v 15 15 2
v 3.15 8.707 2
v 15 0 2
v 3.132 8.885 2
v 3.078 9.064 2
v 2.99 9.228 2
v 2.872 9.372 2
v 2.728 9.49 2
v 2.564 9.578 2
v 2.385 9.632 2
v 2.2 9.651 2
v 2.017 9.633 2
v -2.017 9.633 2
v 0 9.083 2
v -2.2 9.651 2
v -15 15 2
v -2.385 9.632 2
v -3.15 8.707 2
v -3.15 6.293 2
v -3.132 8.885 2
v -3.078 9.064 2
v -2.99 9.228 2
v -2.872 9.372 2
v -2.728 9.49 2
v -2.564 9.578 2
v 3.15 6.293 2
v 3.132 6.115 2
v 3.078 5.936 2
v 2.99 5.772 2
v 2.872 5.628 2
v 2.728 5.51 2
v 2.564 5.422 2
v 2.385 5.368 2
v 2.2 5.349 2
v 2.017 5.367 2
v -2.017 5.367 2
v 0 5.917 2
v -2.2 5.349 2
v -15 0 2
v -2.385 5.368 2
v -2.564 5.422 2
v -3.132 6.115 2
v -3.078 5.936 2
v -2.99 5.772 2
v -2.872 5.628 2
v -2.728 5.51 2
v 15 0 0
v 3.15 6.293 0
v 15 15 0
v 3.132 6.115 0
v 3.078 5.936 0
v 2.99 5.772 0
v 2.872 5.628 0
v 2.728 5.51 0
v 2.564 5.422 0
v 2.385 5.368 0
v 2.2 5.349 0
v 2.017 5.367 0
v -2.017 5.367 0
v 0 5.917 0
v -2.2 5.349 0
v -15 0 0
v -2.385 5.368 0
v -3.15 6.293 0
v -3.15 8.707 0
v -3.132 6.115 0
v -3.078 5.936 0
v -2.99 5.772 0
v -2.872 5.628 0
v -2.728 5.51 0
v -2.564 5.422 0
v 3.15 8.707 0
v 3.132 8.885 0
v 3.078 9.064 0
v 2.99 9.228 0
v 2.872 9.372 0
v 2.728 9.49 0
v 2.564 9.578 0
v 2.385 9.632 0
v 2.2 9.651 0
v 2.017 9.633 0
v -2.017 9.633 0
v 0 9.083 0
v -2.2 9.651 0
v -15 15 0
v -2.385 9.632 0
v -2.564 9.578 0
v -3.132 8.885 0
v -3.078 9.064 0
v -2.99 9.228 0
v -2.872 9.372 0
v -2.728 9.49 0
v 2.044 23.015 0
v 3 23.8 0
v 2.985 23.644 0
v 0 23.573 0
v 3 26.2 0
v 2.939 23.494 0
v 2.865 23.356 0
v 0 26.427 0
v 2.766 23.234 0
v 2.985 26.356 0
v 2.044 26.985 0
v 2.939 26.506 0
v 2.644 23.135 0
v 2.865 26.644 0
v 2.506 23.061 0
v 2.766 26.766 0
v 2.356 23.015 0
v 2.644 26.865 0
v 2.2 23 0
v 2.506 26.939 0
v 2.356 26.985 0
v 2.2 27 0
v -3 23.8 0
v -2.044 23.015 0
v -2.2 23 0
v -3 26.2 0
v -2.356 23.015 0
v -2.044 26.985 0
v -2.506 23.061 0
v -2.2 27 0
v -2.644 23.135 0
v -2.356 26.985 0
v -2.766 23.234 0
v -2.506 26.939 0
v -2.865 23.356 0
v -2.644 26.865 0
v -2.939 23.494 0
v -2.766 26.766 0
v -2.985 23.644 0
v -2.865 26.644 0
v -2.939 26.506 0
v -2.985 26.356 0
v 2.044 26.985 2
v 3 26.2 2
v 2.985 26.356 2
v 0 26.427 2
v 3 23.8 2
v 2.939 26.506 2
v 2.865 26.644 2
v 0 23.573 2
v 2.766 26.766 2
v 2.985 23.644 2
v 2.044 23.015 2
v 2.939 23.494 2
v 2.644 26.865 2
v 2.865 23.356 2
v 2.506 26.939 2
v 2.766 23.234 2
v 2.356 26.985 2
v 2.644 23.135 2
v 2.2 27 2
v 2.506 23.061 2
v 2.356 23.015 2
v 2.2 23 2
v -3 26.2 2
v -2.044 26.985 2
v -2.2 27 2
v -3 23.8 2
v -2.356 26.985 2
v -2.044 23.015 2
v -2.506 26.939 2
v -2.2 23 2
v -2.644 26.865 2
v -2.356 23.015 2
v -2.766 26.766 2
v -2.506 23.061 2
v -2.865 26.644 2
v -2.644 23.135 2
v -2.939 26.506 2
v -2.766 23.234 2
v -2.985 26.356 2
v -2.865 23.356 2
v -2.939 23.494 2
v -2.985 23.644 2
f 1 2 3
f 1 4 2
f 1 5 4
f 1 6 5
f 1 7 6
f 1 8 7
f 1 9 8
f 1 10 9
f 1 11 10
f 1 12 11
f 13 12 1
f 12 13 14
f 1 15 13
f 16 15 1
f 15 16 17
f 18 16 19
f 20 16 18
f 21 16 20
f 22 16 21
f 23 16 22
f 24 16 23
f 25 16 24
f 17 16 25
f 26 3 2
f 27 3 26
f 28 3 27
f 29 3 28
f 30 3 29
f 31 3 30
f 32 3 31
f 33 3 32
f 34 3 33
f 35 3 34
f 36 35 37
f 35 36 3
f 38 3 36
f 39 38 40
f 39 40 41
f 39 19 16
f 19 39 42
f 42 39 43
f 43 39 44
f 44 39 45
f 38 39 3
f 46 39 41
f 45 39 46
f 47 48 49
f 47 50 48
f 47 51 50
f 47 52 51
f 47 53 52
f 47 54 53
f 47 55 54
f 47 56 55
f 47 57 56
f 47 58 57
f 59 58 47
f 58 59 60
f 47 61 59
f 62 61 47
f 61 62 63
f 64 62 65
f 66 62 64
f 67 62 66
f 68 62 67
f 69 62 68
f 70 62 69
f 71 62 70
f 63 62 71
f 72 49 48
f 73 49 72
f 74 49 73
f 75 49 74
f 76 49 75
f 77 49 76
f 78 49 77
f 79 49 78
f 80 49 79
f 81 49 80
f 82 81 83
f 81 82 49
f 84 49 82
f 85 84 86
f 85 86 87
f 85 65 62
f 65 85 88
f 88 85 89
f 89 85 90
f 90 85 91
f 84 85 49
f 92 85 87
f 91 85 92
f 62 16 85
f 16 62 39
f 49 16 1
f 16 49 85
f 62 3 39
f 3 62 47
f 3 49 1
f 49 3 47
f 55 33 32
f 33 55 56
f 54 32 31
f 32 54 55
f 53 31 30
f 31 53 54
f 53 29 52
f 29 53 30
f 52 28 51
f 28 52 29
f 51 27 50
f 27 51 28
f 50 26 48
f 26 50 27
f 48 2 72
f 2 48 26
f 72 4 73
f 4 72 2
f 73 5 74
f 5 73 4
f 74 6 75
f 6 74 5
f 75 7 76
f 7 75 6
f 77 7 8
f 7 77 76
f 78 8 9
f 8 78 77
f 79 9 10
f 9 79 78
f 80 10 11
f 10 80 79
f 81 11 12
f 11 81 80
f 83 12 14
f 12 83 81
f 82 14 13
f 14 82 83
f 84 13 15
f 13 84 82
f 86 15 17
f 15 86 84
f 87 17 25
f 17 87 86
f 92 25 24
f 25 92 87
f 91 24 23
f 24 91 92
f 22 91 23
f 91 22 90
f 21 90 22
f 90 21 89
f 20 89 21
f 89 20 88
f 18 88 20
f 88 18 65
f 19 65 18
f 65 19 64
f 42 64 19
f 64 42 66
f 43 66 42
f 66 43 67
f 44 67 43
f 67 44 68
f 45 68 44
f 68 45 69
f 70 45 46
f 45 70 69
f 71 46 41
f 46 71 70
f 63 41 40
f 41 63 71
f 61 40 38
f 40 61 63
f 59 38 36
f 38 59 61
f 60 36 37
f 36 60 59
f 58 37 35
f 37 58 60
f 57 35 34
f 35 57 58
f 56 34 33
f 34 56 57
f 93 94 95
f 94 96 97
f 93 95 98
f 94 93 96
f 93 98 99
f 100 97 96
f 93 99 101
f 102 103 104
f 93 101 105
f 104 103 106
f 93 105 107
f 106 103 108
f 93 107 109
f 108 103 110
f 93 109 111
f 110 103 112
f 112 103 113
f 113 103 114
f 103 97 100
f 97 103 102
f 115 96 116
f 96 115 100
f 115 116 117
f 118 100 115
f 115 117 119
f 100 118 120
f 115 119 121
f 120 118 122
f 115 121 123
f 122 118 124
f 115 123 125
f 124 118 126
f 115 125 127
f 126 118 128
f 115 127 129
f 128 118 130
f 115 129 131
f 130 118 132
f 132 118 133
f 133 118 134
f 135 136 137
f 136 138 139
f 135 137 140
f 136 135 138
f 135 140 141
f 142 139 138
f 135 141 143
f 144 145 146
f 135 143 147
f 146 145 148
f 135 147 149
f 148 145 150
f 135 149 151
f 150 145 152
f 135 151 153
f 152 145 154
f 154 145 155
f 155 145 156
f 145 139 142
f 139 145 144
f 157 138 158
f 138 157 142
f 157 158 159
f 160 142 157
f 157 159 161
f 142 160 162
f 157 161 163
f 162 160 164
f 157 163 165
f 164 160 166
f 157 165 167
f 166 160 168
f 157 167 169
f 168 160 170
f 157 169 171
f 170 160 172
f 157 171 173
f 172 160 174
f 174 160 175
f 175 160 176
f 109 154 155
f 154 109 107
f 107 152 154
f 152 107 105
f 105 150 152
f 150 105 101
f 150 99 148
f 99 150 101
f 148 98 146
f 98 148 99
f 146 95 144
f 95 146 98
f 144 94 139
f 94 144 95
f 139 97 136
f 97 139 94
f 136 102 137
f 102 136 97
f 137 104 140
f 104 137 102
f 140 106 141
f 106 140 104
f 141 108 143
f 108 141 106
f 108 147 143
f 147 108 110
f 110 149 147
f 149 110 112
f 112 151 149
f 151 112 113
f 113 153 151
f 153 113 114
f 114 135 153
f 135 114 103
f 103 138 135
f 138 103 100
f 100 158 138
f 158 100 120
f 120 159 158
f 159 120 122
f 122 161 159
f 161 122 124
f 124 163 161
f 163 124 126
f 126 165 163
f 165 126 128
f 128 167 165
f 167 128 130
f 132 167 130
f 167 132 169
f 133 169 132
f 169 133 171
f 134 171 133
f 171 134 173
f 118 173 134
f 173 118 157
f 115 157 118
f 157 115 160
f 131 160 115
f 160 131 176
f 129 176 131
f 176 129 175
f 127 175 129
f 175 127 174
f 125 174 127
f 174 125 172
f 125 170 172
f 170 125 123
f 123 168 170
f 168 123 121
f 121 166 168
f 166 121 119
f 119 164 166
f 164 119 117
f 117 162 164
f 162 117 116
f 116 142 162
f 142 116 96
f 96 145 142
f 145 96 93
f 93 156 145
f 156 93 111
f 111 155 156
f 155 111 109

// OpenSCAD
// gridfinity_frame_connectors.scad
//
// A loose bowtie ("butterfly key") connector for joining separately printed
// Gridfinity baseplates along a shared edge. A key-shaped pocket is cut
// straddling the seam in each plate (see gridfinity_baseplate.scad's
// `key_*` parameters), and a separately printed key (gridfinity_key()) is
// dropped in vertically across the seam. Because the key is narrower at its
// waist (centered on the seam) than at either end, it resists the two
// plates being pulled apart sideways once both pockets are filled -- the
// same principle as a woodworking bowtie/butterfly inlay.
//
// Attribution: this bowtie profile is adapted from the ButterFlyConnector()
// module in ostat's gridfinity_extended_openscad project
// (modules/module_gridfinity_frame_connectors.scad),
// https://github.com/ostat/gridfinity_extended_openscad, licensed GPL-3.0.
// It's reimplemented standalone here -- without that project's grid/frame
// coordinate system ($gci, env_pitch(), etc.) -- to match this repo's
// conventions. See README.md for the full attribution notice.
//
// Units are millimeters. The 2D profile is centered on the origin with its
// long axis (lobe to lobe) along X and its waist at x = 0 -- lay the origin
// on the seam between two plates so one lobe embeds in each plate.
//
// Usage:
//   use <gridfinity_frame_connectors.scad>
//   linear_extrude(2) gridfinity_key_2d();         // the loose key, printed separately
//   linear_extrude(2) gridfinity_key_socket_2d();  // pocket to cut into each plate
//
// Open this file directly (or `include <>` it) to render the demo at the
// bottom; `use <>` imports the modules without rendering anything.

// ---------------------------------------------------------------------------
// 2D profile
// ---------------------------------------------------------------------------

// The bowtie/butterfly profile: two rounded wedges tip to tip, wide at each
// end and pinched at the waist (x = 0).
//   size : [length, width] -- overall lobe-to-lobe length (X) and lobe width (Y)
//   r    : corner radius; also sets the minimum waist half-width
module gridfinity_key_2d(size = [6, 4], r = 0.8, fn = 32) {
    a = size.y / 2 - r; // half-height of each lobe's wide edge
    b = size.x / 2 - r; // distance from center to each lobe's wide edge

    module wedge()
        hull() {
            translate([-b, -a]) circle(r = r, $fn = fn);
            translate([-b, a]) circle(r = r, $fn = fn);
            translate([b, 0]) circle(r = r, $fn = fn);
        }

    union() {
        wedge();
        mirror([1, 0, 0]) wedge();
    }
}

// An oversized pocket matching gridfinity_key_2d(), sized with `clearance`
// added all around so the loose key seats with a snug press fit.
module gridfinity_key_socket_2d(size = [6, 4], r = 0.8, clearance = 0.15, fn = 32)
    offset(delta = clearance)
        gridfinity_key_2d(size, r, fn);

// ---------------------------------------------------------------------------
// 3D key
// ---------------------------------------------------------------------------

// The loose butterfly key, extruded to `thickness` -- print this once per
// connector, separately from either baseplate.
module gridfinity_key(size = [6, 4], r = 0.8, thickness = 2, fn = 32)
    linear_extrude(thickness)
        gridfinity_key_2d(size, r, fn);

// ---------------------------------------------------------------------------
// Demo (rendered only when this file is opened / included directly)
// ---------------------------------------------------------------------------

// Two abutting plate stubs, each with a matching pocket straddling the
// seam at x = 0, and the loose key that drops into both -- laid out to one
// side so the fit is visible.
$fn = 32;
difference() {
    union() {
        translate([-15, 0, 0]) cube([15, 15, 2], center = false);
        translate([0, 0, 0]) cube([15, 15, 2], center = false);
    }
    translate([0, 7.5, -0.01])
        linear_extrude(2.02)
            gridfinity_key_socket_2d();
}
translate([0, 25, 0])
    gridfinity_key();
